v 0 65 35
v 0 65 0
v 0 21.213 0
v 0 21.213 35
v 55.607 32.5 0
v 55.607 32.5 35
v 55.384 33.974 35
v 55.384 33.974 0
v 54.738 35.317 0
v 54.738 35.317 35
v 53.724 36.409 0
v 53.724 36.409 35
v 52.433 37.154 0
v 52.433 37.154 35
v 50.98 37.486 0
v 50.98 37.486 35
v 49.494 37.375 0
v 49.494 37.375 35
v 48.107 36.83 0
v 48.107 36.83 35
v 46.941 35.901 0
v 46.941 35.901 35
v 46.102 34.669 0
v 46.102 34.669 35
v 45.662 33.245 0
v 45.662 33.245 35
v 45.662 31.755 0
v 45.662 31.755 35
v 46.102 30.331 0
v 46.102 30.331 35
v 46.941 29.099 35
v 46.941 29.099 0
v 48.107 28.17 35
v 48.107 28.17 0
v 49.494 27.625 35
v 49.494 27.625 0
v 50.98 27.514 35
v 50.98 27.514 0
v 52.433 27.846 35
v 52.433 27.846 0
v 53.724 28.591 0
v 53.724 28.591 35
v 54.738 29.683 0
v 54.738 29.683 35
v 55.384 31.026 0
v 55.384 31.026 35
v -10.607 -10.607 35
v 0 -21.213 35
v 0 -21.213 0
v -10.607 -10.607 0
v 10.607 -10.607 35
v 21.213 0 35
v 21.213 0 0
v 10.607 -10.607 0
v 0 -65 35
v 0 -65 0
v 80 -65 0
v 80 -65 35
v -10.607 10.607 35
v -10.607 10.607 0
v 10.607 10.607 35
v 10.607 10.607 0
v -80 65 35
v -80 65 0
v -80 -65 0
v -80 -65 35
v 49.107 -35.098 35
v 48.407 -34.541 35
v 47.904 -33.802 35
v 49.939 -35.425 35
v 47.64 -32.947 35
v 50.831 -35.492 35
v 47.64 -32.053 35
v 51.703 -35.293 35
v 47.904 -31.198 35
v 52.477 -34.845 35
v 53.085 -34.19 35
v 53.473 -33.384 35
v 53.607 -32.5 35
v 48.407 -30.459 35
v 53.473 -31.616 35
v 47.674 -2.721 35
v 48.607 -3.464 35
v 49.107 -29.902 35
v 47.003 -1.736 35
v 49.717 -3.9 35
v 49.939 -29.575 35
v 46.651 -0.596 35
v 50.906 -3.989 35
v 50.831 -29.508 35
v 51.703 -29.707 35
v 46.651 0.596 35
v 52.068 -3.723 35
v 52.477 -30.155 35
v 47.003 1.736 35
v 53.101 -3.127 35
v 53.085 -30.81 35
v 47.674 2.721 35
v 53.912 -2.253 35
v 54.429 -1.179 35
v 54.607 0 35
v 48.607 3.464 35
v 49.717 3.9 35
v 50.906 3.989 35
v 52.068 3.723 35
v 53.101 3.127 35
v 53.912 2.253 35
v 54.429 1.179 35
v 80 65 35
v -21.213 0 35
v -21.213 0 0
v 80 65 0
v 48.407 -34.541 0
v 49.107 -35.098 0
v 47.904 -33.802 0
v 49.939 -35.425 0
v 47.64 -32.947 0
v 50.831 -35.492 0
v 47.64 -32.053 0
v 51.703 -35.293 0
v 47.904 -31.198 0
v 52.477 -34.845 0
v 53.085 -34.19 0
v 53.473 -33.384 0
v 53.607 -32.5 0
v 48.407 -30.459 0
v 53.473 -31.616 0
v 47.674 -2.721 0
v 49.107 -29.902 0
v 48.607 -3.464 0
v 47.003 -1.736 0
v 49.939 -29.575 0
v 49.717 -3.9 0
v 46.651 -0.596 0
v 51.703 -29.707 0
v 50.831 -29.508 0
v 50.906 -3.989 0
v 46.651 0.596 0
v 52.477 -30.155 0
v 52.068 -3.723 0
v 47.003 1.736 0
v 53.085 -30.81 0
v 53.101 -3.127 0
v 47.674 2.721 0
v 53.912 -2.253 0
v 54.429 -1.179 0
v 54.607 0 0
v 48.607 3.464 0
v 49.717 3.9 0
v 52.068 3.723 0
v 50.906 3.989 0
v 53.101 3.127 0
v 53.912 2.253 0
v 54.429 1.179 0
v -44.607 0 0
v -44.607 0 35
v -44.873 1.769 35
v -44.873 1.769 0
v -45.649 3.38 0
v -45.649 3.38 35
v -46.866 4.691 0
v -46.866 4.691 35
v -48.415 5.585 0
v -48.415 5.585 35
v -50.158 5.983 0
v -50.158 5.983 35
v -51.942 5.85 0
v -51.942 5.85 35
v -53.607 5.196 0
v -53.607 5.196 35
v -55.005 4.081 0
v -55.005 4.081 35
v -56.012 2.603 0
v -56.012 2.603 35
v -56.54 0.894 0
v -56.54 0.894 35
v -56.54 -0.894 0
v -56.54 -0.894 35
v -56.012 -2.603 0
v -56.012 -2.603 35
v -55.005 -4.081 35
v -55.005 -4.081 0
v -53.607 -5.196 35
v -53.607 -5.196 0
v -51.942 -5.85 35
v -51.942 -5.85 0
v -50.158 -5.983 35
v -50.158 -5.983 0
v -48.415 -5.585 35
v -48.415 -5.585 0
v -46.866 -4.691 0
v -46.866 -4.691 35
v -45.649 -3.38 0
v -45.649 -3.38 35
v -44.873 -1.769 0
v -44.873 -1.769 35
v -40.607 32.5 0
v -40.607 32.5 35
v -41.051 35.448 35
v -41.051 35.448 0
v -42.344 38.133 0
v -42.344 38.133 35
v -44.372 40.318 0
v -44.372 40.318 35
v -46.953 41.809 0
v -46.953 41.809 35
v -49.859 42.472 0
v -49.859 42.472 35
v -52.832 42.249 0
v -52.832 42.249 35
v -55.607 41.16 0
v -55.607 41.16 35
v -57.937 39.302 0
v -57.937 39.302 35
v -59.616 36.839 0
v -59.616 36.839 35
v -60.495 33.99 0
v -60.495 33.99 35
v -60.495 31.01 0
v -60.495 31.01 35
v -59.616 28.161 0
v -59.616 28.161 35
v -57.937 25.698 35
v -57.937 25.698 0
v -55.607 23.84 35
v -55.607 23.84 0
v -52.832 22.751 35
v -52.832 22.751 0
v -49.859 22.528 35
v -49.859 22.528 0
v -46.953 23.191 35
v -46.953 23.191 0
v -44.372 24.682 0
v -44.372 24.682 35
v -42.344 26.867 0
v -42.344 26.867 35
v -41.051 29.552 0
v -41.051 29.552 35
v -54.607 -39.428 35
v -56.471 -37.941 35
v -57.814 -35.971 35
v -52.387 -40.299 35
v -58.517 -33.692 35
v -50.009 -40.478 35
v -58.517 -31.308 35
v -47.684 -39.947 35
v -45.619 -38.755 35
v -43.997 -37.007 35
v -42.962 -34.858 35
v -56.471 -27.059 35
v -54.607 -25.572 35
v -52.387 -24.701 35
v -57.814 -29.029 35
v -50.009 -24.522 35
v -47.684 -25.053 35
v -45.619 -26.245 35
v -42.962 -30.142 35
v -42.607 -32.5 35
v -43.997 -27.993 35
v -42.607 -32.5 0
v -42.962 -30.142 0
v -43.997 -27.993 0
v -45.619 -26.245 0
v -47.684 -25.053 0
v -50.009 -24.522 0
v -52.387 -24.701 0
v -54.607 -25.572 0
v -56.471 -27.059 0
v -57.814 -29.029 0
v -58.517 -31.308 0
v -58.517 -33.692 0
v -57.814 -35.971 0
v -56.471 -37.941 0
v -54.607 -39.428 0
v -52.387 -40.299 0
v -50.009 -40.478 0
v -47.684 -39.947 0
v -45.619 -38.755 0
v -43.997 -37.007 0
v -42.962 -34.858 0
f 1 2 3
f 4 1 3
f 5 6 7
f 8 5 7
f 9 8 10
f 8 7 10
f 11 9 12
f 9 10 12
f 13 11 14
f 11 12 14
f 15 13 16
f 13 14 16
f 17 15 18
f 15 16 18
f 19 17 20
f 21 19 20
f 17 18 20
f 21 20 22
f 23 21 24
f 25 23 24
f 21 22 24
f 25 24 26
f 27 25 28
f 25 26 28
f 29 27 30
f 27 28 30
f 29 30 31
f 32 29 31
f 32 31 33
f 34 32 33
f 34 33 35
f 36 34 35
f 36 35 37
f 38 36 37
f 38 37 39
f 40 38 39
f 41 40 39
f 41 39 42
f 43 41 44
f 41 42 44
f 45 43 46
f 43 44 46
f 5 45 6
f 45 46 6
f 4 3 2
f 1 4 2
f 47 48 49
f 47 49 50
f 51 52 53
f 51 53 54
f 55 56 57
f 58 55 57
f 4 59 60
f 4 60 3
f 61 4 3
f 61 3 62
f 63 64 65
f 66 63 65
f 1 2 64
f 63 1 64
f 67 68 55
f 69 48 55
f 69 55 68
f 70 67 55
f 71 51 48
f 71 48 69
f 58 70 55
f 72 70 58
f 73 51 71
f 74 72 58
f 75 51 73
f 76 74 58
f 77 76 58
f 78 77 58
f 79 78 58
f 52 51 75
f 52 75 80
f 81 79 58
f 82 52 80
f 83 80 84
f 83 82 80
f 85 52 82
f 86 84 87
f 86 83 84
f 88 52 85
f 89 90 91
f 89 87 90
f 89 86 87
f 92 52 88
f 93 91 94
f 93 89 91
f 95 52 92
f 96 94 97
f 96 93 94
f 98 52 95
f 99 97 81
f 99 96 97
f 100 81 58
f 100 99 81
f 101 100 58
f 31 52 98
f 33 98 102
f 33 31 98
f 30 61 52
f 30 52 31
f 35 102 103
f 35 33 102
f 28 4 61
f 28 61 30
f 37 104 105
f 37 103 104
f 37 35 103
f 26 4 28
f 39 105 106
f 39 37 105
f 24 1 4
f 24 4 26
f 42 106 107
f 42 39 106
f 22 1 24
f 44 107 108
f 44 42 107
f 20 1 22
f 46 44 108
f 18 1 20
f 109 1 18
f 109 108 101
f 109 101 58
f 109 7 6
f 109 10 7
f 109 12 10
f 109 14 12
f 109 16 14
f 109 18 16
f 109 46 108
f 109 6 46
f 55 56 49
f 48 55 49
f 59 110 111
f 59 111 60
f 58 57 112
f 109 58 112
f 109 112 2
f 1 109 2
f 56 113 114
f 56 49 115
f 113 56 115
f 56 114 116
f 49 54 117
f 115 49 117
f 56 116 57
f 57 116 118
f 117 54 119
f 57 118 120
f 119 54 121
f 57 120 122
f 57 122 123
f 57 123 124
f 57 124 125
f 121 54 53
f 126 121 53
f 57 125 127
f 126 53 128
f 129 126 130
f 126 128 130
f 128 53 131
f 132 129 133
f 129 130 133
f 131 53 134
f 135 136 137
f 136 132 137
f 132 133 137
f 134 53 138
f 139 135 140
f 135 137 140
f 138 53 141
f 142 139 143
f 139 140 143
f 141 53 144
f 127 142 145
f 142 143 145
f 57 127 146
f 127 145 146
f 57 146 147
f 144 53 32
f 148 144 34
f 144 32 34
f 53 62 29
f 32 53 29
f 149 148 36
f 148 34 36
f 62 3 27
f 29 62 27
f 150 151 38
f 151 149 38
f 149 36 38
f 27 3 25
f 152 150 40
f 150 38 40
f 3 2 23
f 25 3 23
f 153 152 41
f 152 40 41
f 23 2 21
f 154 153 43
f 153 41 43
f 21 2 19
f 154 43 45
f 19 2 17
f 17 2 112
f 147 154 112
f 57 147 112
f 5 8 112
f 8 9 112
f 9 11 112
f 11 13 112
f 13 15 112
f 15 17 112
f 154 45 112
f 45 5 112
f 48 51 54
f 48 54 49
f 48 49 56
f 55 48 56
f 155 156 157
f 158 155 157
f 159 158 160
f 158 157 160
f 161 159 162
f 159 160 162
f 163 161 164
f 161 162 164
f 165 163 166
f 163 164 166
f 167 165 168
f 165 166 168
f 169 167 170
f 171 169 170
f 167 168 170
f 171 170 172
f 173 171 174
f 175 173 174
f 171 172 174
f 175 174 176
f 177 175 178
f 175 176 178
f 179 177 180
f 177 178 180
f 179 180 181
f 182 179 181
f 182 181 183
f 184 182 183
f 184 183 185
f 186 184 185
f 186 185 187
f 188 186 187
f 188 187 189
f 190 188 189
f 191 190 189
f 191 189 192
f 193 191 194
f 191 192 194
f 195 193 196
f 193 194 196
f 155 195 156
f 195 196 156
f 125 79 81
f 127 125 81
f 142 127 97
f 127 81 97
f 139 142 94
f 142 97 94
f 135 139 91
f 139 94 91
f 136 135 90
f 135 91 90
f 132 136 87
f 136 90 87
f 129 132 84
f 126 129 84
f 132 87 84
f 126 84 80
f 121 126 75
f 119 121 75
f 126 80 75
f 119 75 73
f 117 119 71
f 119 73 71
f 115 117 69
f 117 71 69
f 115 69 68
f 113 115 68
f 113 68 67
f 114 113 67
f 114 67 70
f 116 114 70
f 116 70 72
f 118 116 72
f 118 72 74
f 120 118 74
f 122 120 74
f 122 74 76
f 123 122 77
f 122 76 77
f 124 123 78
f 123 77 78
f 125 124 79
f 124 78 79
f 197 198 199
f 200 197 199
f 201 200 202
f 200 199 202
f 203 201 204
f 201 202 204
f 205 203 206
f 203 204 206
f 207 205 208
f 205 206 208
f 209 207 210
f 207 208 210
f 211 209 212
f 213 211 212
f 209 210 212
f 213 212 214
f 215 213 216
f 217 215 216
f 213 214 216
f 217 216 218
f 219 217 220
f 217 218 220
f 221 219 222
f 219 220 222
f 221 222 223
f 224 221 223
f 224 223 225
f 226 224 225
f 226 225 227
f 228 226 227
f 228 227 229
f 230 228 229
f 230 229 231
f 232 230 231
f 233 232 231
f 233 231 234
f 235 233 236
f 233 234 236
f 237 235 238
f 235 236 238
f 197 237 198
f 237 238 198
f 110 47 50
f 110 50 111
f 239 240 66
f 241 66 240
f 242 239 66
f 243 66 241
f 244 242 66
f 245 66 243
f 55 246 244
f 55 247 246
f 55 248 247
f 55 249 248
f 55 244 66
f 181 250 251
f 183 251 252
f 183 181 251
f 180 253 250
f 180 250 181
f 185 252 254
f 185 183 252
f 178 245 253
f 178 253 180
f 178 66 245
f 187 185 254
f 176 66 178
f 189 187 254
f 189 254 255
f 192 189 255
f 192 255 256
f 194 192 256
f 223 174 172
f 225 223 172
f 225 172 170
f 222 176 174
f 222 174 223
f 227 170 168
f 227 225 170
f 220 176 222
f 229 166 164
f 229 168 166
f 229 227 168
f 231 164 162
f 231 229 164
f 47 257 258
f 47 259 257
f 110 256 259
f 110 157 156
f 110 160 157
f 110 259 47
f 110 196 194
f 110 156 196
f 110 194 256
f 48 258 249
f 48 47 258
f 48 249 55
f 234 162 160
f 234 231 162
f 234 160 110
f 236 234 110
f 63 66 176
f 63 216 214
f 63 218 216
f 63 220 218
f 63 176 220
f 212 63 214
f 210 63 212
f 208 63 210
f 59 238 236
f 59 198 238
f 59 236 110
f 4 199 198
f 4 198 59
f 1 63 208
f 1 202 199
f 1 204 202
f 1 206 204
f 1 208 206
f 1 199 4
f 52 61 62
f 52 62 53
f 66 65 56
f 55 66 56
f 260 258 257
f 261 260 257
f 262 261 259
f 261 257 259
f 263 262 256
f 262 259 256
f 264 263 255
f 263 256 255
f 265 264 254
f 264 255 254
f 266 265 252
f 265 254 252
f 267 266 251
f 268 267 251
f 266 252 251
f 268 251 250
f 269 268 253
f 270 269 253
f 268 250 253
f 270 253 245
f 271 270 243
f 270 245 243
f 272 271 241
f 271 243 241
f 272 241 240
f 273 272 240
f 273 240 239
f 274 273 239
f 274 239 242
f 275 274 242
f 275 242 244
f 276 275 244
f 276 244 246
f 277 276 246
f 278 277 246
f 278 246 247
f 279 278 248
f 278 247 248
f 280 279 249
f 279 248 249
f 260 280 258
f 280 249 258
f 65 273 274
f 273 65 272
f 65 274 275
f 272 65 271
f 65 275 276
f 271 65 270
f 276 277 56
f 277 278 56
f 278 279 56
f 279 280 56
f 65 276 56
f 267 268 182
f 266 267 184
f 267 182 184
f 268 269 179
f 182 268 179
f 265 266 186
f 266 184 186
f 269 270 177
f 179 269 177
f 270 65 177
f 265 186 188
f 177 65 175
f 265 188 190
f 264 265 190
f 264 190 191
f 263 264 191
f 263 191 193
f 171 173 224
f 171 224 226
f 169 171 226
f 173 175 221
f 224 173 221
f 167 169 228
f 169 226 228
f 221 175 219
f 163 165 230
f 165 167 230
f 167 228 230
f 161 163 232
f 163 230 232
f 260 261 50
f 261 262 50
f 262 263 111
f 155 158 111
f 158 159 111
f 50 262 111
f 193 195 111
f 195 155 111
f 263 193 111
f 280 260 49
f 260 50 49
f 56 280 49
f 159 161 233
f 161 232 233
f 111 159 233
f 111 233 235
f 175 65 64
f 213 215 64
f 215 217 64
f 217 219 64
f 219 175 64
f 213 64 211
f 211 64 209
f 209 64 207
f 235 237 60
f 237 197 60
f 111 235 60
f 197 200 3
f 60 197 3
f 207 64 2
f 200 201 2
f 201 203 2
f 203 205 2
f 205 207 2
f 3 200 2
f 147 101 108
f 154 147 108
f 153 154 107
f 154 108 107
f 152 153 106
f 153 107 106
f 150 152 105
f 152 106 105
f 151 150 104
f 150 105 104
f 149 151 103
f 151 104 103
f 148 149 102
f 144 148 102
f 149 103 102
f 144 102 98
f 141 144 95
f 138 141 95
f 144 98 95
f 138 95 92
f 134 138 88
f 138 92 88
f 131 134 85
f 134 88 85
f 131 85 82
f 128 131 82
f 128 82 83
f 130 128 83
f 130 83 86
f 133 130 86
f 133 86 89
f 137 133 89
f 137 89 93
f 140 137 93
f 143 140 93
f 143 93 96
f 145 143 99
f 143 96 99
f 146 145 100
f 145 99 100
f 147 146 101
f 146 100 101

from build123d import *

# Parameters (mm, degrees)
F1_DEPTH = 35
F2_DEPTH = 35
F3_R     = 10
F3_R_2   = 6
F3_R_3   = 8
F4_DEPTH = 35
F5_R     = 5
F5_R_2   = 4
F5_R_3   = 3
F6_DEPTH = 35


with BuildPart() as f1:
    # F0 (on Top) → F1 (new body)
    with BuildSketch(Plane.XY):
        Polygon((-80, -65), (0, -65), (0, -21.213203), (-10.606602, -10.606602), (-21.213203, 0), (-10.606602, 10.606602), (0, 21.213203), (0, 65), (-80, 65), align=None)
    extrude(amount=F1_DEPTH)

    # F3 (on face) → F4 (cut)
    with BuildSketch(Plane.XY.offset(35)):
        with Locations((-50.606602, 32.5)):
            Circle(F3_R)
        with Locations((-50.606602, 0)):
            Circle(F3_R_2)
        with Locations((-50.606602, -32.5)):
            Circle(F3_R_3)
    extrude(amount=-F4_DEPTH, mode=Mode.SUBTRACT)


with BuildPart() as f2:
    # F0 (on Top) → F2 (new body)
    with BuildSketch(Plane.XY):
        Polygon((0, -65), (80, -65), (80, 65), (0, 65), (0, 21.213203), (10.606602, 10.606602), (21.213203, 0), (10.606602, -10.606602), (0, -21.213203), align=None)
    extrude(amount=F2_DEPTH)

    # F5 (on face) → F6 (cut)
    with BuildSketch(Plane.XY.offset(35)):
        with Locations((50.606602, 32.5)):
            Circle(F5_R)
        with Locations((50.606602, 0)):
            Circle(F5_R_2)
        with Locations((50.606602, -32.5)):
            Circle(F5_R_3)
    extrude(amount=-F6_DEPTH, mode=Mode.SUBTRACT)


solid = Compound([f1.part, f2.part])
